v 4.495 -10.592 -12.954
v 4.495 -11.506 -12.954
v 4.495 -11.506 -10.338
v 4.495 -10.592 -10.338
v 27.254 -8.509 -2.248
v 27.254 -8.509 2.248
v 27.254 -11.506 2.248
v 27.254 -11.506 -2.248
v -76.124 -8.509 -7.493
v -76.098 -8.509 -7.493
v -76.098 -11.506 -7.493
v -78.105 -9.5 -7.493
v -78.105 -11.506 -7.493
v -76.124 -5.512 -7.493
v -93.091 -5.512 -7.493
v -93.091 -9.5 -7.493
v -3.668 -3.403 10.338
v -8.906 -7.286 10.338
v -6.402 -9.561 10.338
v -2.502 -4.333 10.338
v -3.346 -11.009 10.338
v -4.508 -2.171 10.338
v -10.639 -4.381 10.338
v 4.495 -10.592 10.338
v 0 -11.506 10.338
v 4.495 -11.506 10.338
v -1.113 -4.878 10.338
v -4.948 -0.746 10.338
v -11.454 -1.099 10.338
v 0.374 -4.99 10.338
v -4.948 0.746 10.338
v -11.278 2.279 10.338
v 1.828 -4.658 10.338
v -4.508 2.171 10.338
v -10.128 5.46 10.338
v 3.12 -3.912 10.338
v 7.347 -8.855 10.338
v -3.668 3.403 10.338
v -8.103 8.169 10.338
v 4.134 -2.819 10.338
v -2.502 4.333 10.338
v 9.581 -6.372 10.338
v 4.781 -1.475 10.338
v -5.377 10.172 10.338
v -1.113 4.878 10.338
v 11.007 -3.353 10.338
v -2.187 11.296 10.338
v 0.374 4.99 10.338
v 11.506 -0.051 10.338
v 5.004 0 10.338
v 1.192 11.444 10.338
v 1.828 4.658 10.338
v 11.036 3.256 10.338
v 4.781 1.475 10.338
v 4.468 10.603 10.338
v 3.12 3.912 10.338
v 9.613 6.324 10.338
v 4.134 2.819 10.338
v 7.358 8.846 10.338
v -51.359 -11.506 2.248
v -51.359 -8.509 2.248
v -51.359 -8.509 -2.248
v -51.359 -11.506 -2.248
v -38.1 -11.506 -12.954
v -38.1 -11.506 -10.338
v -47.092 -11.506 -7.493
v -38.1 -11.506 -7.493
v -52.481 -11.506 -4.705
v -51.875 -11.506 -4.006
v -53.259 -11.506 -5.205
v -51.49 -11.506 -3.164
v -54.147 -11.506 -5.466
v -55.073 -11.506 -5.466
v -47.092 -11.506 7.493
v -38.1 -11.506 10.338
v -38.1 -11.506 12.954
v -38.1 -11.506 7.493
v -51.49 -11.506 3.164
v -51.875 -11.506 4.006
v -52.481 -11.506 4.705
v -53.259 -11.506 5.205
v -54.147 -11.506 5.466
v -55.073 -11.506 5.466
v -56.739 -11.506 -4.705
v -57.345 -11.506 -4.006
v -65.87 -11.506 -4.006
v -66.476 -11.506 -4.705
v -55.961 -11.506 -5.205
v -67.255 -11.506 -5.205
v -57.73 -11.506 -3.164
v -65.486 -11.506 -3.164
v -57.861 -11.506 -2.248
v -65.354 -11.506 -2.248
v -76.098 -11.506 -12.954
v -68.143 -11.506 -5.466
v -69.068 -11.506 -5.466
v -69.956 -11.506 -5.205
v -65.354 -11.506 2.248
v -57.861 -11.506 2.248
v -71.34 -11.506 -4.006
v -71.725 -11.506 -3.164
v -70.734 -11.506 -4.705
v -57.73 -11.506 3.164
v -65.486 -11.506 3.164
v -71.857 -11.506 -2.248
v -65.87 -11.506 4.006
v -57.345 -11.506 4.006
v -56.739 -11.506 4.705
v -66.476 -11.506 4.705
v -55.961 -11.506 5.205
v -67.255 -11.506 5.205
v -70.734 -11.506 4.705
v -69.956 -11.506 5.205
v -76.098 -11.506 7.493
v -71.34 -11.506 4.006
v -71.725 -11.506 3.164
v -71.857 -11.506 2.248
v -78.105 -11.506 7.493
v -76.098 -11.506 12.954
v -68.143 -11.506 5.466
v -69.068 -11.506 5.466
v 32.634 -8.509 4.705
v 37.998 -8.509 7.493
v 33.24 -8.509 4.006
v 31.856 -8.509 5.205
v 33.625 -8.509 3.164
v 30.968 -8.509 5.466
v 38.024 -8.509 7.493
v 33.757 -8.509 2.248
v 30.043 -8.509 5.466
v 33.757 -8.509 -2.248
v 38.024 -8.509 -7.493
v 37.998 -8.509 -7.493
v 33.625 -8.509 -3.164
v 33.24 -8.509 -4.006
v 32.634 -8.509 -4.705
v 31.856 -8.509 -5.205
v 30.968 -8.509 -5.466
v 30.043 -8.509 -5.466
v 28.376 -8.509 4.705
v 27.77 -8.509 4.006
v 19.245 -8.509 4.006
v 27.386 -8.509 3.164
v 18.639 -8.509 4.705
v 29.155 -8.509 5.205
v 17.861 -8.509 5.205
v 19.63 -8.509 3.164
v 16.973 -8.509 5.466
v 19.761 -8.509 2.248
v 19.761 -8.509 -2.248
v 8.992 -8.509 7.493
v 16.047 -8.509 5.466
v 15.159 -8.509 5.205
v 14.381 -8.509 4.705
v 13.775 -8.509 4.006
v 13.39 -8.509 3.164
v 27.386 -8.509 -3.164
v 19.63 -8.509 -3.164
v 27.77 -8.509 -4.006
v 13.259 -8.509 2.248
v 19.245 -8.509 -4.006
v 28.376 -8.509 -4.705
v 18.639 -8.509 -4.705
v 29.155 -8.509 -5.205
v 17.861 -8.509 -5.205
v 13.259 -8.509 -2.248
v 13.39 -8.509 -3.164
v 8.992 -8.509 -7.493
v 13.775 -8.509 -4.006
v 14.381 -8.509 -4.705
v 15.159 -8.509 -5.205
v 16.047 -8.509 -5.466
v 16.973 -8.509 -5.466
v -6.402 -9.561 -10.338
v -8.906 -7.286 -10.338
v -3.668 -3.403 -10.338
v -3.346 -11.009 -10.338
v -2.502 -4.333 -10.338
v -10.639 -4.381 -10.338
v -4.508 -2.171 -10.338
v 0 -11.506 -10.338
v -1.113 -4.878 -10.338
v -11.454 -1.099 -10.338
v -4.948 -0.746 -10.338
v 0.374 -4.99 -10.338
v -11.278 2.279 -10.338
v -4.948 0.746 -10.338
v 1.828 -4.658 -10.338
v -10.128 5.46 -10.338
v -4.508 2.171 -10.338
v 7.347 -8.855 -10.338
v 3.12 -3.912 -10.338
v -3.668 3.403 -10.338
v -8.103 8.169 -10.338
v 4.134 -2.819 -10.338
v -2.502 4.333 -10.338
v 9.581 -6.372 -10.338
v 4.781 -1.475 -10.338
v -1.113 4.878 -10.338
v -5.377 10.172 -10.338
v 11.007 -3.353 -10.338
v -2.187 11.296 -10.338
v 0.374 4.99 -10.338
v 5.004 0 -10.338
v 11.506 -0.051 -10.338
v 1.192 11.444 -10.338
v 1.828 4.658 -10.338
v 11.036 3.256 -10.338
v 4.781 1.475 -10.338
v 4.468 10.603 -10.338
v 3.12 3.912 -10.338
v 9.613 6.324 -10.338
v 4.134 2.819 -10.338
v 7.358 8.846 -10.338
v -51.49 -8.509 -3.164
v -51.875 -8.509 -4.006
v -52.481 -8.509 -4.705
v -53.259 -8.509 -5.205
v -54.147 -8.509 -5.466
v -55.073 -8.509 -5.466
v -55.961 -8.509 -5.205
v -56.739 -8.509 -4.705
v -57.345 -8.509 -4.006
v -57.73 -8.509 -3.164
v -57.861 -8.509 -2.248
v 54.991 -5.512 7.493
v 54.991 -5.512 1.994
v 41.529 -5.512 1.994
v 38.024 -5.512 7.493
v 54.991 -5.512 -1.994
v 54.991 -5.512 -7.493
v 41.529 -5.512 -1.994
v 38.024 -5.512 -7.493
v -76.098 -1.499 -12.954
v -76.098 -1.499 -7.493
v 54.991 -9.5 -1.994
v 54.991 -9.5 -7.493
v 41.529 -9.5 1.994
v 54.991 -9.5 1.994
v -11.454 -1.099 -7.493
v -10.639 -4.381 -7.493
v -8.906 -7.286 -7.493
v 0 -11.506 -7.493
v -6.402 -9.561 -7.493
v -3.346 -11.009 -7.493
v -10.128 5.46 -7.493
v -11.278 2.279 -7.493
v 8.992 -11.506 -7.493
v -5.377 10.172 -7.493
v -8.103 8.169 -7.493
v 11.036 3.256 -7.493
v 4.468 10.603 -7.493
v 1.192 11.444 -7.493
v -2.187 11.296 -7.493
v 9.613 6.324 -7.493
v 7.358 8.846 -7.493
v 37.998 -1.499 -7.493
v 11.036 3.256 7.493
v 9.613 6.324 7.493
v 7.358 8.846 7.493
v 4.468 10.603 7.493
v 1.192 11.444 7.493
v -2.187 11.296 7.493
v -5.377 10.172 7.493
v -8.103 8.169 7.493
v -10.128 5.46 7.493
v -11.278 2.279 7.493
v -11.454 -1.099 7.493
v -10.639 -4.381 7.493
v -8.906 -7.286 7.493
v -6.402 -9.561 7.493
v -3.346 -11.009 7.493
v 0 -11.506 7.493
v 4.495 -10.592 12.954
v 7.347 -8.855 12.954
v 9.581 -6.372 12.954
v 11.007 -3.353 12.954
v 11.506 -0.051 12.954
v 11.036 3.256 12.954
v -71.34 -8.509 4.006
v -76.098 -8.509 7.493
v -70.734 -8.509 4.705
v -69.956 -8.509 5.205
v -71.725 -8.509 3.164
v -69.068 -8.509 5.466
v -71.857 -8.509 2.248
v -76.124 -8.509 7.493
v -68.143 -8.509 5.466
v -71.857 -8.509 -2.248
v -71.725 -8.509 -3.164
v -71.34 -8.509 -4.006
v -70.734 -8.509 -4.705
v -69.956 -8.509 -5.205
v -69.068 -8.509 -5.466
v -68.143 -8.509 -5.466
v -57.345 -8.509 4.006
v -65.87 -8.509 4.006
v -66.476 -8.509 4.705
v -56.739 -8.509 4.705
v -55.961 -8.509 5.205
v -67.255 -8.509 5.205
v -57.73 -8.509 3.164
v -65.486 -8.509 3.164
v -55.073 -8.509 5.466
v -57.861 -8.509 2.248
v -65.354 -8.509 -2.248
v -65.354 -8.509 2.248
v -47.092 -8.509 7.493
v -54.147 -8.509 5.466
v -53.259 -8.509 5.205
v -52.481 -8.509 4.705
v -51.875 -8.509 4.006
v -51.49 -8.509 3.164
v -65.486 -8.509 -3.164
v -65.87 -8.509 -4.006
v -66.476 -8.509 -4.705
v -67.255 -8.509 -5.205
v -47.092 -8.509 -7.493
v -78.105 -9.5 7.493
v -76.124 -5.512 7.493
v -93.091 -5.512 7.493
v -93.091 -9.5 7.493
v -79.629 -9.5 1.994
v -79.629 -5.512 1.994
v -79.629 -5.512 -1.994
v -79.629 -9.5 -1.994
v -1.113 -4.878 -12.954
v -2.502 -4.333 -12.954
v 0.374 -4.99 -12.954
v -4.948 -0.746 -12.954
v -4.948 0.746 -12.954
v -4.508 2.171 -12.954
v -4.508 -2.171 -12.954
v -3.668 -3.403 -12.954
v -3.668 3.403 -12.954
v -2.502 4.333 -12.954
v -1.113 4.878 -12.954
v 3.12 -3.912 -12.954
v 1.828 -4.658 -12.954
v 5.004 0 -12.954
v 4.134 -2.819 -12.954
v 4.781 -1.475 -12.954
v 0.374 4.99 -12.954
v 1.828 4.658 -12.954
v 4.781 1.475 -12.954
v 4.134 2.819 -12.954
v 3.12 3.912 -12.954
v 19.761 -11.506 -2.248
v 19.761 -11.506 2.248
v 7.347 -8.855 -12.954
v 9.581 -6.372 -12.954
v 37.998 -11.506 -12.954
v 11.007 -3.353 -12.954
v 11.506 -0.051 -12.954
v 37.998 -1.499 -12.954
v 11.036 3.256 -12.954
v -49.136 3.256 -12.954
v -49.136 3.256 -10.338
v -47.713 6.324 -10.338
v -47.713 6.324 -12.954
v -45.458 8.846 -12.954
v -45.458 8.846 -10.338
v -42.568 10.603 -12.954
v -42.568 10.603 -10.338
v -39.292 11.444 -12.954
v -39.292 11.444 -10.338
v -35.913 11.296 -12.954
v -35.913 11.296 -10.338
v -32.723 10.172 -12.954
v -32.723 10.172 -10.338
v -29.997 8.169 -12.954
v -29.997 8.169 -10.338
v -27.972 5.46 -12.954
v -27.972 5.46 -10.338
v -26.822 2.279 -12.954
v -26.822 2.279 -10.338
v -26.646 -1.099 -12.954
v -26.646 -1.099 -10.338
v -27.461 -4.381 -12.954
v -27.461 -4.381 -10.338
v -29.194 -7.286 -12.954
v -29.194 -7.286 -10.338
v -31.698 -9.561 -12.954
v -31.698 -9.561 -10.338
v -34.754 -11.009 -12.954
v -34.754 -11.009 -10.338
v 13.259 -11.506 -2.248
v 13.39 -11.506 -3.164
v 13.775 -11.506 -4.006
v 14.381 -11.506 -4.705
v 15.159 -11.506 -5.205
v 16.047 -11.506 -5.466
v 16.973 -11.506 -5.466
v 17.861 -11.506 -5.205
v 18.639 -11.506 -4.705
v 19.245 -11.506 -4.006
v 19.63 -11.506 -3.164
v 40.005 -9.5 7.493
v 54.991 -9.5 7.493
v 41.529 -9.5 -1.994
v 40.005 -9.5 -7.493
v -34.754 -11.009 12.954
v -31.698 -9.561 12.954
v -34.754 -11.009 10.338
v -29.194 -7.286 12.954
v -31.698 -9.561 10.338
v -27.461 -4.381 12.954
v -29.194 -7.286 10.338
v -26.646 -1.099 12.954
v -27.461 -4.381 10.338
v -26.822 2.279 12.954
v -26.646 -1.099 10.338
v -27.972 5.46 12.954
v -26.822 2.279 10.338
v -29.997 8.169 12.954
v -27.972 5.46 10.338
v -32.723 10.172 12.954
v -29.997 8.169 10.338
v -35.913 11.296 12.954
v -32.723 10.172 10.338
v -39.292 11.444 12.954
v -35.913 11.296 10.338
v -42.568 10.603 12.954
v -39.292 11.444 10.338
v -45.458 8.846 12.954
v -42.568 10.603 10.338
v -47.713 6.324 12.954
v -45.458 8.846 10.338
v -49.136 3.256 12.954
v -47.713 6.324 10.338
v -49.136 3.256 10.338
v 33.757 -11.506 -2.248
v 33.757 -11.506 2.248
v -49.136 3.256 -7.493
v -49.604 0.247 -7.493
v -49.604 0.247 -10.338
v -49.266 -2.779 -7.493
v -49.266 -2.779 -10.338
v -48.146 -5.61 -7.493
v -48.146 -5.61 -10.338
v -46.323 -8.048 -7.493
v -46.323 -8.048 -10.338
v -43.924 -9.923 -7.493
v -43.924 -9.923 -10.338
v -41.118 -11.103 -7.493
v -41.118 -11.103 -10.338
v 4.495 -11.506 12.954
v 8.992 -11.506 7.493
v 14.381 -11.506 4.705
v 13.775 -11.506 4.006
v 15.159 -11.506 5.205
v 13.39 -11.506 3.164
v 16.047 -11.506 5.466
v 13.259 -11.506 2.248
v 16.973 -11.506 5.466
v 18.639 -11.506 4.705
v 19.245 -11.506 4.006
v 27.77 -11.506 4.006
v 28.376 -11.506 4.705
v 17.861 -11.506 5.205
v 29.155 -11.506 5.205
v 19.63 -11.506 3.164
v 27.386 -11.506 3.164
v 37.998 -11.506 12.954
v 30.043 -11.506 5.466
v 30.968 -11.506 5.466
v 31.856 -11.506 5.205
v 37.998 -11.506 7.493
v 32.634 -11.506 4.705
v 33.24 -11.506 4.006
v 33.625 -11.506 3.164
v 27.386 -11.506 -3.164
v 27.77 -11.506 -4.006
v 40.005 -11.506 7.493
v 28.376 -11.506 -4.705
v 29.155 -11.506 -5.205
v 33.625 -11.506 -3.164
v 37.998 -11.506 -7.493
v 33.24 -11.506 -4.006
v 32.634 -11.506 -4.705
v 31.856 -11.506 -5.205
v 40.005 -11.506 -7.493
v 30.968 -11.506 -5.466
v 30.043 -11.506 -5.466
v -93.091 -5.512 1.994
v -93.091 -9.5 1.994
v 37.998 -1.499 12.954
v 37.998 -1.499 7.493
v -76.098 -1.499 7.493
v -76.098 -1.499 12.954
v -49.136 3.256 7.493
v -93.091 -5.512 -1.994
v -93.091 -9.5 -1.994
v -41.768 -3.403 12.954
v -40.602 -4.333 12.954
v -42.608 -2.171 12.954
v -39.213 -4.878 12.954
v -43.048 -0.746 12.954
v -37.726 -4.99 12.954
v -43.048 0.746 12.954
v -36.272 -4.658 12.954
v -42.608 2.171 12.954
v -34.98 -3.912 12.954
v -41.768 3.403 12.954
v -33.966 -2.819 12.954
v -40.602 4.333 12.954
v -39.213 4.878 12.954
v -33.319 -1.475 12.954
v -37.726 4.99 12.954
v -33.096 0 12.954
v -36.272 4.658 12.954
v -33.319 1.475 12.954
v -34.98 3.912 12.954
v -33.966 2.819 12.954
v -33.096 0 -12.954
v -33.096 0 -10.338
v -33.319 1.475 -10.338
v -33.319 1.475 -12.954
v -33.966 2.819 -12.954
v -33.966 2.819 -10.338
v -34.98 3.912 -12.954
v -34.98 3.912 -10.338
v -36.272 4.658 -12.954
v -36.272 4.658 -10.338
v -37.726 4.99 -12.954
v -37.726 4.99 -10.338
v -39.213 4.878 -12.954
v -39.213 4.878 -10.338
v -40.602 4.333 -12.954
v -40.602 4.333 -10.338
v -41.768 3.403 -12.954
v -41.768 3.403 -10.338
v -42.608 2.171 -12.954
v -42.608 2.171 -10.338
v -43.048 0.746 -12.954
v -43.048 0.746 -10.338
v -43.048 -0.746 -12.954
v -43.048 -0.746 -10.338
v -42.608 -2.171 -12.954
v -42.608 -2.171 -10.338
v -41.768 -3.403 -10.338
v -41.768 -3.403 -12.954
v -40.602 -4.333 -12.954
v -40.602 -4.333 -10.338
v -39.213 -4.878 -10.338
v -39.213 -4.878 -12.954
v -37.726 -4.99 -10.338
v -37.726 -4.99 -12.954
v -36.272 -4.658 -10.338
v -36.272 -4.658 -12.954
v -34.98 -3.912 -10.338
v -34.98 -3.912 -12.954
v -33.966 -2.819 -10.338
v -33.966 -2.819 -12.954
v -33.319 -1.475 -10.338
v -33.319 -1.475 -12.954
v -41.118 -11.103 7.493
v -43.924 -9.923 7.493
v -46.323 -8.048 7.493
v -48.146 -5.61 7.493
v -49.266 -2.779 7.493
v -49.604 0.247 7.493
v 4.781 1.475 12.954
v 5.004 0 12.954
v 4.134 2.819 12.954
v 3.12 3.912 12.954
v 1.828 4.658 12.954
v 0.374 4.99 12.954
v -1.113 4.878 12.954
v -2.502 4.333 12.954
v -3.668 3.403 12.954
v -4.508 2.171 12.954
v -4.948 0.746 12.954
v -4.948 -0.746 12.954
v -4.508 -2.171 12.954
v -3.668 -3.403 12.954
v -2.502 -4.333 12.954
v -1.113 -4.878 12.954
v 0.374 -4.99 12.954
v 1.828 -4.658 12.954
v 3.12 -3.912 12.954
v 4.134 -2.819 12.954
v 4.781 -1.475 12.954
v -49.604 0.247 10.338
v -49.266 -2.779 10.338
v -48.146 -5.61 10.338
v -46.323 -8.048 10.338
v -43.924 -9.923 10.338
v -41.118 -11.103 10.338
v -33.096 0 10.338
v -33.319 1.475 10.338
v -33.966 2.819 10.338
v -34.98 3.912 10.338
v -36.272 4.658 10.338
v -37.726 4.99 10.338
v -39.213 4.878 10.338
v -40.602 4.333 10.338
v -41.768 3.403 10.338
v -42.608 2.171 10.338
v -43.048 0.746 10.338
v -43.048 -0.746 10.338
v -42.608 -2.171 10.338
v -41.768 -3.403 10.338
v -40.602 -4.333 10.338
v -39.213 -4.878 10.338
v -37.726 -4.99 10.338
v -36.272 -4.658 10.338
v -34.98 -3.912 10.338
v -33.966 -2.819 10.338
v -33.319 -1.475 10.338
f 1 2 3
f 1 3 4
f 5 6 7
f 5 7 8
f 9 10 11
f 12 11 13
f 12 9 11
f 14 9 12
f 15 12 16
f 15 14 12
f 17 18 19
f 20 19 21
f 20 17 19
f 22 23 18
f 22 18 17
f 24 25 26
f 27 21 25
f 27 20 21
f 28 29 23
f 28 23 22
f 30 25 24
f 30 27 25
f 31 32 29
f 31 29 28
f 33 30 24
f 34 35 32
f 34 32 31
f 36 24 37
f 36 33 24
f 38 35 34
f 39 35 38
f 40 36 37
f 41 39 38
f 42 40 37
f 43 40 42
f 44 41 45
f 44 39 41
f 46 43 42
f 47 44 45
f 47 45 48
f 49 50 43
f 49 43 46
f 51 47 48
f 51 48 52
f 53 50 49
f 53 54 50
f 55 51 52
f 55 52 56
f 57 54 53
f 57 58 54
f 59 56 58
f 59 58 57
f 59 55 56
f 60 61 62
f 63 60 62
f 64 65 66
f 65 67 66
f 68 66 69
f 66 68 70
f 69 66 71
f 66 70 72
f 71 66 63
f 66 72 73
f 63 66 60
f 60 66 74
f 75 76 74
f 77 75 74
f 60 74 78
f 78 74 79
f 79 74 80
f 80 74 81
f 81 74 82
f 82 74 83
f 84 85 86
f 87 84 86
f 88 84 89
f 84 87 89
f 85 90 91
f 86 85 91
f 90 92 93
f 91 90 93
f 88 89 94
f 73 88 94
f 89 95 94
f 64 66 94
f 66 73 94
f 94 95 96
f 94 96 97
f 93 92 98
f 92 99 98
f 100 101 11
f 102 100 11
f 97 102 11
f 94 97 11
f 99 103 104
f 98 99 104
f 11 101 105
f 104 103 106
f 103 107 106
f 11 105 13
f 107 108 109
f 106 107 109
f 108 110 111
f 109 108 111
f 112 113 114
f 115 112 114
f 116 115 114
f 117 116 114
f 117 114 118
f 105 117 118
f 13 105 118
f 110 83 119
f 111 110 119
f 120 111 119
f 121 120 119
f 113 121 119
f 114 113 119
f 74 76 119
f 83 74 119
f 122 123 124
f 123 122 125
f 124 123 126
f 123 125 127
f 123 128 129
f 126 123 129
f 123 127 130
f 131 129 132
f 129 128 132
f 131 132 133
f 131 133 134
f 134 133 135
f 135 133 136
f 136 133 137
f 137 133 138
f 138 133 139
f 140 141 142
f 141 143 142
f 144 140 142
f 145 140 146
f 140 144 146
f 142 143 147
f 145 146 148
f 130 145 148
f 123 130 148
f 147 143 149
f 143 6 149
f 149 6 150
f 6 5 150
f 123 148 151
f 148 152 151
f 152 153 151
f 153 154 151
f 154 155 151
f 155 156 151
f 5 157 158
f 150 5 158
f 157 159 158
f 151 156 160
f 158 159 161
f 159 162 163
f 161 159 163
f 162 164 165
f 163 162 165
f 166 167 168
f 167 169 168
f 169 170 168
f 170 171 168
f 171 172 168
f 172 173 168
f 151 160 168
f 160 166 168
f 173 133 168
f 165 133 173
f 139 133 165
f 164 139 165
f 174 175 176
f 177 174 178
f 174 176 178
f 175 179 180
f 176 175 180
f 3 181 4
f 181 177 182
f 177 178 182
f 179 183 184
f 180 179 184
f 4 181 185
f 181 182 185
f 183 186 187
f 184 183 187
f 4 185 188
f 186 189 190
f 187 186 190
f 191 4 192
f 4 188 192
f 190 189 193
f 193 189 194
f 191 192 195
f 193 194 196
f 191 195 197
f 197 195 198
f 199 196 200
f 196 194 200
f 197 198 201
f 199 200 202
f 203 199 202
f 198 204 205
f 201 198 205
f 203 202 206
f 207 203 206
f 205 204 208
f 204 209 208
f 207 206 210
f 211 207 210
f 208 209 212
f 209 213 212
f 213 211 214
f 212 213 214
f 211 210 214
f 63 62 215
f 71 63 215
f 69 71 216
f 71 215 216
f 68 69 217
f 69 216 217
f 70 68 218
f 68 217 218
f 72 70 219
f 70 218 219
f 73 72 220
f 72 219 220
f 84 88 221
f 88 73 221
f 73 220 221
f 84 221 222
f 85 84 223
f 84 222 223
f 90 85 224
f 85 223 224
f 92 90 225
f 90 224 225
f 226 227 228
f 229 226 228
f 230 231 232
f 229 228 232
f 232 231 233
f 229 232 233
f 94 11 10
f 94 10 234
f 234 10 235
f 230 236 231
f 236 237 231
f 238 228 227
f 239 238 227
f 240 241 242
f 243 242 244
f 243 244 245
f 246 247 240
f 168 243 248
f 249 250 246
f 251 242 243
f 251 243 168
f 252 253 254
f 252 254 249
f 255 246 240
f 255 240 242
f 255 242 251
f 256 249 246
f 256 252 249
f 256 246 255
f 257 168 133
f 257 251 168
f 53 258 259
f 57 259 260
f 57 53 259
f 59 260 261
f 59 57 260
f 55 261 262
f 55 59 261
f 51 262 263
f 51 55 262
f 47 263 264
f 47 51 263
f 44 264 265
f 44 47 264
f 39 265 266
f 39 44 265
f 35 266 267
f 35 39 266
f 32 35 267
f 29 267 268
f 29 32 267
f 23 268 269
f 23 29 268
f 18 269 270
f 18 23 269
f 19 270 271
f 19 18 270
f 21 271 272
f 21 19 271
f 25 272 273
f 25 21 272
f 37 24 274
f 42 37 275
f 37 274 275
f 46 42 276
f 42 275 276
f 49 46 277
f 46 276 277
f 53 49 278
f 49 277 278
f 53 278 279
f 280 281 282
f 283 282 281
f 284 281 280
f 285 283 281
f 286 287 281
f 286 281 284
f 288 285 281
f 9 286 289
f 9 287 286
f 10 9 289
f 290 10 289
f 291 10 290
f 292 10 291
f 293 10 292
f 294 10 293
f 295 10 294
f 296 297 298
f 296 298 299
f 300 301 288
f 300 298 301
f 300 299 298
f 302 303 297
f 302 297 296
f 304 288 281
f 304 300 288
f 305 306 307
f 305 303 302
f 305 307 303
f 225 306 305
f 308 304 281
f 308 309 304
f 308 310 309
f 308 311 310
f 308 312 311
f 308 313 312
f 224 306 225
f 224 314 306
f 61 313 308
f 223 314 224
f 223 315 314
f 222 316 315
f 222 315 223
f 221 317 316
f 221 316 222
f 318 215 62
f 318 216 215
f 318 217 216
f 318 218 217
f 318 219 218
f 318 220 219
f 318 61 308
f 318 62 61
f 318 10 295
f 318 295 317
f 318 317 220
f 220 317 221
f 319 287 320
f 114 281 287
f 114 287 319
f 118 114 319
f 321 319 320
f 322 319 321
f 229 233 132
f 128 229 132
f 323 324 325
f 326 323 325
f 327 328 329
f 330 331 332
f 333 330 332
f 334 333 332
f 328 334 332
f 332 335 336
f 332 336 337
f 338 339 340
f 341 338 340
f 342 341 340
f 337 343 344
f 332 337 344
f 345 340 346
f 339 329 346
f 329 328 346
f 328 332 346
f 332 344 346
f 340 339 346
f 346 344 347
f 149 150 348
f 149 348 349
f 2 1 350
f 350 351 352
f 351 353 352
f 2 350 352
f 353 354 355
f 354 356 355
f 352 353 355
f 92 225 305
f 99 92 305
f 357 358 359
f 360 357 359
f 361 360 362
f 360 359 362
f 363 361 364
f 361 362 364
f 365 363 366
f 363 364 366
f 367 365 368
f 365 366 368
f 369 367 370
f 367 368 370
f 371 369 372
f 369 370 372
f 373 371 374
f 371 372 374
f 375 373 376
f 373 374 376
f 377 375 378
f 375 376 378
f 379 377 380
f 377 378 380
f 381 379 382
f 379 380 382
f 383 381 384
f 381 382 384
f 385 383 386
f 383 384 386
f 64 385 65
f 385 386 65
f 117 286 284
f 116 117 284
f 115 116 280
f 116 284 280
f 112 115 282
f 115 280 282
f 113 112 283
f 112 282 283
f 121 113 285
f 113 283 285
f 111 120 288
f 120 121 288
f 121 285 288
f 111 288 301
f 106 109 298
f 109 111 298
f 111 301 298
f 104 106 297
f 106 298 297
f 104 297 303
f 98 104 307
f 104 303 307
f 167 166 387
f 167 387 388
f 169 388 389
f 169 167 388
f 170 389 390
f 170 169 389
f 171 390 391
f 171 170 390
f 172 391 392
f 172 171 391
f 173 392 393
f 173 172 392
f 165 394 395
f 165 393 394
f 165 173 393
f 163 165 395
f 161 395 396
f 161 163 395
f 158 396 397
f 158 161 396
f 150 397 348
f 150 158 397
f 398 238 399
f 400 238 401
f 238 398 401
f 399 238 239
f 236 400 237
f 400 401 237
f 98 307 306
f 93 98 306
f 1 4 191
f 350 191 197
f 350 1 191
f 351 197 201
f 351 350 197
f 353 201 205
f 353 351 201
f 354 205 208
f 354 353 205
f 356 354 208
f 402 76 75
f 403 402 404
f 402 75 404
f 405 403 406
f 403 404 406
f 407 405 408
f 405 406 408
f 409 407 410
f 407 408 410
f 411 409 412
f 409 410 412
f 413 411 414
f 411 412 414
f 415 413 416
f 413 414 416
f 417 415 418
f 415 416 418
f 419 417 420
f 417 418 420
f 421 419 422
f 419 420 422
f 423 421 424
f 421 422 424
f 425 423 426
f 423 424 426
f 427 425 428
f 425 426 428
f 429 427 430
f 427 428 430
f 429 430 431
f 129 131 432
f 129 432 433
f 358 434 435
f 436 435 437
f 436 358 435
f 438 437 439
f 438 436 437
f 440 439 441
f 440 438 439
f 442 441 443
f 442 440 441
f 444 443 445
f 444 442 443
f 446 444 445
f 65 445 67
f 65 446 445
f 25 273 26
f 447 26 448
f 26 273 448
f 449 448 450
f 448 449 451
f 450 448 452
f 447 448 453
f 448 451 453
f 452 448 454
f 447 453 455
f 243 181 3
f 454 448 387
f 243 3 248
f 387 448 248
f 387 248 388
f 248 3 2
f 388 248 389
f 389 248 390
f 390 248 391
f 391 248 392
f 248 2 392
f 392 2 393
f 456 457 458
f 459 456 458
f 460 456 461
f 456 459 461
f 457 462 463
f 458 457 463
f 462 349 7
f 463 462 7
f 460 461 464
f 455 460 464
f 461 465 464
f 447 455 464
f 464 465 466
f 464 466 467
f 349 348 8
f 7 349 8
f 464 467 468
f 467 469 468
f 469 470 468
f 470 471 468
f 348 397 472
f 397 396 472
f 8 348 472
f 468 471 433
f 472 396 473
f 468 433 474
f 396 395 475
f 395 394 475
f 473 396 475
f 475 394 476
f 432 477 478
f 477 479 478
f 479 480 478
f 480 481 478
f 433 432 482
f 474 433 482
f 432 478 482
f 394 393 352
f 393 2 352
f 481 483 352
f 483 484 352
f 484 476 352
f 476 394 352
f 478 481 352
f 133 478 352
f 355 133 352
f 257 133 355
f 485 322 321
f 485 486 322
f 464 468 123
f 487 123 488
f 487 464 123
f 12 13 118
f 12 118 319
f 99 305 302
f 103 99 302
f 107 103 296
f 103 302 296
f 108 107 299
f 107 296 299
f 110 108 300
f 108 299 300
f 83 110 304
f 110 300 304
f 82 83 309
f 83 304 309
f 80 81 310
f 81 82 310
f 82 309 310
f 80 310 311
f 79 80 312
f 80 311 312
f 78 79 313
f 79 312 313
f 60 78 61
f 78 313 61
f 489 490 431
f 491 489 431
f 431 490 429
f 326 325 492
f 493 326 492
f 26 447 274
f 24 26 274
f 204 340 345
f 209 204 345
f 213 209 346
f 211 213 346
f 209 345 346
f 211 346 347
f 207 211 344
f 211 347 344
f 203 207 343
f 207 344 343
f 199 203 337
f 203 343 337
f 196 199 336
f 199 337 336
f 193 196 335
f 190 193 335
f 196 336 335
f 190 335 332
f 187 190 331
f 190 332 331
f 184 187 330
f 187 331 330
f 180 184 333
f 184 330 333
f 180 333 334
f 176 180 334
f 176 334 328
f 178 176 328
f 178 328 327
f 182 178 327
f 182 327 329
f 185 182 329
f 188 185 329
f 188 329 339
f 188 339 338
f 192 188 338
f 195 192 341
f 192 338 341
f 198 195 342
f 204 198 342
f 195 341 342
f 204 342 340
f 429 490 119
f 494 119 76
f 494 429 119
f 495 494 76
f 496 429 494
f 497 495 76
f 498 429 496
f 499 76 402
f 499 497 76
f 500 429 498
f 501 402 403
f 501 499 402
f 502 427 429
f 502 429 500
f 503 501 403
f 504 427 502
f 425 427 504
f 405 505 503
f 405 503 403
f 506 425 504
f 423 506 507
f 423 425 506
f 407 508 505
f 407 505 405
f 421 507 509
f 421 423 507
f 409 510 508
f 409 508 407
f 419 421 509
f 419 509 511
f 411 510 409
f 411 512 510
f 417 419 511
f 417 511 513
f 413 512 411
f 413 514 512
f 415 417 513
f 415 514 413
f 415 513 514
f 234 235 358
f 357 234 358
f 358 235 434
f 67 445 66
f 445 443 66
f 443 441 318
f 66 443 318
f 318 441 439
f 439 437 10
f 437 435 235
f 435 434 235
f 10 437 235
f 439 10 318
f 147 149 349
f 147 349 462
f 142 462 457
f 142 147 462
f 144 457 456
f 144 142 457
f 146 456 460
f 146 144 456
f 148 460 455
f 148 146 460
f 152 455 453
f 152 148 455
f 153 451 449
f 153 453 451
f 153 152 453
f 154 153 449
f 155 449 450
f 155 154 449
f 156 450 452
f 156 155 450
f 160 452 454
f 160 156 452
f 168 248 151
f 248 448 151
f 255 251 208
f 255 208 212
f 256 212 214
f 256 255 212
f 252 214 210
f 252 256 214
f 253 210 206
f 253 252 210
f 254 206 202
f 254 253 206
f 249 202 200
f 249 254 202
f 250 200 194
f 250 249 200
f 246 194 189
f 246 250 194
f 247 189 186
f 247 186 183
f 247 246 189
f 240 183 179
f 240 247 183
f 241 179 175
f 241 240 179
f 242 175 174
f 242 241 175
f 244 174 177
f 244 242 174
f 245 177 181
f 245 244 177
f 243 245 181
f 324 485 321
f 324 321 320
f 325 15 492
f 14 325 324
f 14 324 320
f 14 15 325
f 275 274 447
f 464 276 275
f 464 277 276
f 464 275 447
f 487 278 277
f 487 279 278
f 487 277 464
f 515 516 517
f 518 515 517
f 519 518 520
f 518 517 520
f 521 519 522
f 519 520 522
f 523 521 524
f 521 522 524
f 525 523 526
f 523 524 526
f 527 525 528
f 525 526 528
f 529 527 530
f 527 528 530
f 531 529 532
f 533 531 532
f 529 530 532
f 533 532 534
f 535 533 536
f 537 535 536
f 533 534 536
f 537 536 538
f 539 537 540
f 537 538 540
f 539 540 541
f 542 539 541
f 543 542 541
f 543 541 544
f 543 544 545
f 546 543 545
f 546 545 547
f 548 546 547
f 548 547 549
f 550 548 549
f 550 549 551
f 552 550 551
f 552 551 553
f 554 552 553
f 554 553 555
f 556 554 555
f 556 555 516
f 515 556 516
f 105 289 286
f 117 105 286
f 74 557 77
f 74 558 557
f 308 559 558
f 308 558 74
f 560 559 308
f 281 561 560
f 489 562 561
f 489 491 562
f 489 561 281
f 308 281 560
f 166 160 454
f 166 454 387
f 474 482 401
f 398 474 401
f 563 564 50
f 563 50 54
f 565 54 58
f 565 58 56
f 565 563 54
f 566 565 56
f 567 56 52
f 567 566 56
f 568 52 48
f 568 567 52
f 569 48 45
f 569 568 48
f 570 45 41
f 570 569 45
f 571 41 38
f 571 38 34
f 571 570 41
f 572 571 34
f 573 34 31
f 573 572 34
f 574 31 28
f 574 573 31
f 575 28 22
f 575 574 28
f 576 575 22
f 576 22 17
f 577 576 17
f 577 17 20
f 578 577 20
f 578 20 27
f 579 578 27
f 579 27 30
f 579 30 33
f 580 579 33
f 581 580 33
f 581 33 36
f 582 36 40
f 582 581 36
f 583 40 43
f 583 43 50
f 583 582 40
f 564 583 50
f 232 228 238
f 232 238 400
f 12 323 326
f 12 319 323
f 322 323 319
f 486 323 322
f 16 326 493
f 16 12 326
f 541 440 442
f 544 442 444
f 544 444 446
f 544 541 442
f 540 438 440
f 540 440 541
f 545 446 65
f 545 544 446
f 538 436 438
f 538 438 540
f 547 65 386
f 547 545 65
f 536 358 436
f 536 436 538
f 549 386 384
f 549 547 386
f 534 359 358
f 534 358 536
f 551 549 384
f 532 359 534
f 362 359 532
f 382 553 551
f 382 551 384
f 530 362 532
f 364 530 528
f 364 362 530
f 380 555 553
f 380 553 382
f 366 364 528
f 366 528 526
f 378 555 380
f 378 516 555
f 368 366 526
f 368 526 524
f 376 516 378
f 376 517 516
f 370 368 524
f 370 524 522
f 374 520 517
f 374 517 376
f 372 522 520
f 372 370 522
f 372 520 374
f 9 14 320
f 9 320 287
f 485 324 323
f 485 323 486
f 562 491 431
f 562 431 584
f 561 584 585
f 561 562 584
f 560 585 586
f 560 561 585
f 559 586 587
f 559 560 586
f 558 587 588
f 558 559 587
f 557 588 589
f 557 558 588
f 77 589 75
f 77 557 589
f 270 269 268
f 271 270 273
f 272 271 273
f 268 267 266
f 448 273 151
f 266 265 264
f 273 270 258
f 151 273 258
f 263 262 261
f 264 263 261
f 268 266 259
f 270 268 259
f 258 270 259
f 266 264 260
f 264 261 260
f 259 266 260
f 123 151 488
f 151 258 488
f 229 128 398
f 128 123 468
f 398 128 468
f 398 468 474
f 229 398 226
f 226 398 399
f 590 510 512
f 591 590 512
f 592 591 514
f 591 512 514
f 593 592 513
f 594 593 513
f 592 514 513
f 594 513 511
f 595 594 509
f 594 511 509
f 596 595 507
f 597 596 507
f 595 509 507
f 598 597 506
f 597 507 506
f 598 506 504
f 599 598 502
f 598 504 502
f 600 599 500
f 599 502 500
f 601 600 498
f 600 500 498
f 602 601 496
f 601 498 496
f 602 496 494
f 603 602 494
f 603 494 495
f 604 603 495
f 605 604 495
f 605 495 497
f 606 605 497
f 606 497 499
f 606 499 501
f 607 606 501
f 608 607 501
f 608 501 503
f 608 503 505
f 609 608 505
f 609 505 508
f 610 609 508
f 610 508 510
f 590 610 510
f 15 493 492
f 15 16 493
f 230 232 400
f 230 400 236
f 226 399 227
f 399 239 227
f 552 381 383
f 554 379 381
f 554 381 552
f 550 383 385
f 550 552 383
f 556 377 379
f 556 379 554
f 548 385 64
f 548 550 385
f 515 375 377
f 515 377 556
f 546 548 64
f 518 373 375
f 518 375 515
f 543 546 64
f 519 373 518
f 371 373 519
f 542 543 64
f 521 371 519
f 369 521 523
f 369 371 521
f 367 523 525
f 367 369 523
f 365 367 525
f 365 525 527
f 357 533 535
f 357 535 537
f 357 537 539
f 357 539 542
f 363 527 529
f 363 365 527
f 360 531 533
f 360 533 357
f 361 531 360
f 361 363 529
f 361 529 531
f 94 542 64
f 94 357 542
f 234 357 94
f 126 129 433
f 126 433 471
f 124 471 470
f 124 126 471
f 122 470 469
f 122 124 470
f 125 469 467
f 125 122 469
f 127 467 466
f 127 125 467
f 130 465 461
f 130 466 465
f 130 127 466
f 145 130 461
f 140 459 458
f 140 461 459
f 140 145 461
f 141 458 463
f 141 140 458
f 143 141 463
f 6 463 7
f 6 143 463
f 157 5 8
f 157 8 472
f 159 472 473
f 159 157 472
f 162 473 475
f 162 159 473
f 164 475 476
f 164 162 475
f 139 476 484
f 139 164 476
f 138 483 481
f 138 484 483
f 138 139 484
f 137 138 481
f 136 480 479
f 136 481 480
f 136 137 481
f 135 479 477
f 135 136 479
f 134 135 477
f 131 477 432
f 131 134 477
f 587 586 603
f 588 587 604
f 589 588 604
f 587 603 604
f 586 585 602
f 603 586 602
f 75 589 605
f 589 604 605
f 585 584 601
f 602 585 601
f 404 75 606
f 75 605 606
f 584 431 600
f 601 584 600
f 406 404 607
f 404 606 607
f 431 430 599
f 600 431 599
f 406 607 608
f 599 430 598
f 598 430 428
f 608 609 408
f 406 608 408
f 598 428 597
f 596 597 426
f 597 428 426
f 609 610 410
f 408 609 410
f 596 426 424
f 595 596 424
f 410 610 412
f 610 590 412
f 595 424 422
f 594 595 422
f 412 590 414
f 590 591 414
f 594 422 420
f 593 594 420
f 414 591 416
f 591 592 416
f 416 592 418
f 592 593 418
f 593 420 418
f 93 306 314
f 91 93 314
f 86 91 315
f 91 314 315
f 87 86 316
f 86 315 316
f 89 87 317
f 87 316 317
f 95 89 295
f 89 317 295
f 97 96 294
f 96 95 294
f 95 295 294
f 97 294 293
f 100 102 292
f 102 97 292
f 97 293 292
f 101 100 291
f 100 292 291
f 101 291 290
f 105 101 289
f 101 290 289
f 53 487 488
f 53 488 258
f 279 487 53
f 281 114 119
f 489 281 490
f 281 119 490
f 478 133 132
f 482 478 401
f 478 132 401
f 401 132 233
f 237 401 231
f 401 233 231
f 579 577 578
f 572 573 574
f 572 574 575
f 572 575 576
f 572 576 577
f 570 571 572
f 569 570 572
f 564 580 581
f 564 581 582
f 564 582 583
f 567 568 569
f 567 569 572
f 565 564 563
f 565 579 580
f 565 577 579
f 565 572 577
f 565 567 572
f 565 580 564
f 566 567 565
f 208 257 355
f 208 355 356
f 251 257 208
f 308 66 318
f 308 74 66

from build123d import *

# Parameters (mm, degrees)
EXTRUDE1_DEPTH             = 12.954
SKETCH3_R                  = 5.0038
CUT_EXTRUDE1_DEPTH         = 2.6162
CUT_EXTRUDE2_DEPTH         = 7.493
EXTRUDE2_REACH             = 43.762
EXTRUDE2_DIRECTION_2_REACH = 43.762
SKETCH7_W                  = 13.462
SKETCH7_H                  = 3.9878
CUT_EXTRUDE3_DEPTH         = 60.003631422
CUT_EXTRUDE4_DEPTH         = 60.936836987
EXTRUDE3_OUTLINE_R         = 5.0038
EXTRUDE3_DEPTH             = 2.6162
EXTRUDE4_DEPTH             = 2.6162
SKETCH9_R                  = 5.0038
CUT_EXTRUDE5_DEPTH         = 98.311619982
CUT_EXTRUDE6_START         = -10.3378
SKETCH12_R                 = 11.5062
CUT_EXTRUDE6_DEPTH         = 20.6756


# Read off the part's stored shape, not the designer's step: Extrude3
with BuildPart() as part:
    # Sketch2 → Extrude1 (new, symmetric)
    with BuildSketch(Plane.XY):
        with BuildLine():
            Line((37.9984, -11.5062), (37.9984, -1.4986))
            Line((37.9984, -1.4986), (11.036020087, 3.255595043))
            ThreePointArc((11.036020087, 3.255595043), (-9.215534877, 6.889597621), (0, -11.5062))
            Line((0, -11.5062), (37.9984, -11.5062))
        make_face()
    extrude(amount=EXTRUDE1_DEPTH, both=True)

    # Sketch3 → Cut-Extrude1 (cut)
    with BuildSketch(Plane.XY.offset(12.954)):
        with BuildLine():
            Line((0, -11.5062), (4.495154191, -11.5062))
            Line((4.495154191, -11.5062), (4.495154191, -10.5918))
            ThreePointArc((4.495154191, -10.5918), (-2.293607342, 11.27528287), (0, -11.5062))
        make_face()
        Circle(SKETCH3_R, mode=Mode.SUBTRACT)
    cut_extrude1 = extrude(amount=-CUT_EXTRUDE1_DEPTH, mode=Mode.SUBTRACT)

    # Mirror1: Cut-Extrude1 across plane
    add(cut_extrude1.mirror(Plane.XY), mode=Mode.SUBTRACT)

    # Sketch4 → Cut-Extrude2 (cut, symmetric)
    with BuildSketch(Plane.XY):
        with BuildLine():
            Line((8.9916, -8.509), (37.9984, -8.509))
            Line((37.9984, -8.509), (37.9984, -1.4986))
            Line((37.9984, -1.4986), (11.036020087, 3.255595043))
            ThreePointArc((11.036020087, 3.255595043), (-9.215534877, 6.889597621), (0, -11.5062))
            Line((0, -11.5062), (8.9916, -11.5062))
            Line((8.9916, -11.5062), (8.9916, -8.509))
        make_face()
    extrude(amount=CUT_EXTRUDE2_DEPTH, both=True, mode=Mode.SUBTRACT)

    # Extrude2: up to this face of the body (flat: up to its plane)
    extrude2_end = Plane(part.part.faces().sort_by_distance((8.815484891, -1.610467544, -7.493))[0])
    # Sketch5 → Extrude2 (add, up to the picked face)
    with BuildSketch(Plane.XY, mode=Mode.PRIVATE) as extrude2_sk1:
        Polygon((54.991, -5.5118), (38.0238, -5.5118), (38.0238, -8.509), (37.9984, -8.509), (37.9984, -11.5062), (40.005, -11.5062), (40.005, -9.4996), (54.991, -9.4996), align=None)
    extrude2_tool1 = split(extrude(extrude2_sk1.sketch, amount=-EXTRUDE2_REACH, mode=Mode.PRIVATE), bisect_by=extrude2_end, keep=Keep.BOTH, mode=Mode.PRIVATE)
    add(extrude2_tool1.solids().sort_by(Axis((46.083002, -7.674508, 0), (0, 0, -1)))[0])

    # Extrude2 direction 2: up to this face of the body (flat: up to its plane)
    extrude2_direction_2_end = Plane(part.part.faces().sort_by_distance((8.815484891, -1.610467544, 7.493))[0])
    # Sketch5 → Extrude2 direction 2 (add, up to the picked face)
    with BuildSketch(Plane.XY, mode=Mode.PRIVATE) as extrude2_direction_2_sk1:
        Polygon((54.991, -5.5118), (38.0238, -5.5118), (38.0238, -8.509), (37.9984, -8.509), (37.9984, -11.5062), (40.005, -11.5062), (40.005, -9.4996), (54.991, -9.4996), align=None)
    extrude2_direction_2_tool1 = split(extrude(extrude2_direction_2_sk1.sketch, amount=EXTRUDE2_DIRECTION_2_REACH, mode=Mode.PRIVATE), bisect_by=extrude2_direction_2_end, keep=Keep.BOTH, mode=Mode.PRIVATE)
    add(extrude2_direction_2_tool1.solids().sort_by(Axis((46.083002, -7.674508, 0), (0, 0, 1)))[0])

    # Sketch7 → Cut-Extrude3 (cut, through all)
    with BuildSketch(Plane(origin=(0, -5.5118, 0), x_dir=(1, 0, 0), z_dir=(0, 1, 0))):
        with Locations((48.26, 0)):
            Rectangle(SKETCH7_W, SKETCH7_H)
    extrude(amount=-CUT_EXTRUDE3_DEPTH, mode=Mode.SUBTRACT)

    # Sketch8 → Cut-Extrude4 (cut, through all)
    with BuildSketch(Plane(origin=(0, -8.509, 0), x_dir=(1, 0, 0), z_dir=(0, 1, 0))):
        with BuildLine():
            Line((19.7612, 2.2479), (19.7612, -2.2479))
            ThreePointArc((19.7612, -2.2479), (16.51, -5.4991), (13.2588, -2.2479))
            Line((13.2588, -2.2479), (13.2588, 2.2479))
            ThreePointArc((13.2588, 2.2479), (16.51, 5.4991), (19.7612, 2.2479))
        make_face()
        with BuildLine():
            Line((33.7566, 2.2479), (33.7566, -2.2479))
            ThreePointArc((33.7566, -2.2479), (30.5054, -5.4991), (27.2542, -2.2479))
            Line((27.2542, -2.2479), (27.2542, 2.2479))
            ThreePointArc((27.2542, 2.2479), (30.5054, 5.4991), (33.7566, 2.2479))
        make_face()
    extrude(amount=-CUT_EXTRUDE4_DEPTH, mode=Mode.SUBTRACT)


with BuildPart() as body_2:
    # Mirror3: mirrored copy
    add(part.part.mirror(Plane(origin=(-19.05, 0, 0), x_dir=(0, 0, 1), z_dir=(1, 0, 0))))

    # Extrude3 outline → Extrude3 (add)
    with BuildSketch(Plane.XY.offset(10.3378)):
        with BuildLine():
            ThreePointArc((-38.1, -11.5062), (-28.884465123, 6.889597621), (-49.136020087, 3.255595043))
            ThreePointArc((-49.136020087, 3.255595043), (-48.503938244, -4.91433693), (-42.595154191, -10.5918))
            Line((-42.595154191, -10.5918), (-42.595154191, -11.5062))
            Line((-42.595154191, -11.5062), (-38.1, -11.5062))
        make_face()
        with Locations((-38.1, 0)):
            Circle(EXTRUDE3_OUTLINE_R, mode=Mode.SUBTRACT)
    extrude(amount=EXTRUDE3_DEPTH)

    # Sketch11 → Extrude4 (add)
    with BuildSketch(Plane(origin=(0, 0, -10.3378), x_dir=(-1, 0, 0), z_dir=(0, 0, -1))):
        with BuildLine():
            Line((38.1, -11.5062), (42.595154191, -11.5062))
            Line((42.595154191, -11.5062), (42.595154191, -10.5918))
            ThreePointArc((42.595154191, -10.5918), (48.503938244, -4.91433693), (49.136020087, 3.255595043))
            ThreePointArc((49.136020087, 3.255595043), (28.884465123, 6.889597621), (38.1, -11.5062))
        make_face()
    extrude(amount=EXTRUDE4_DEPTH)

    # Sketch9 → Cut-Extrude5 (cut, through all)
    with BuildSketch(Plane.XY.offset(12.954)):
        with Locations((-38.1, 0)):
            Circle(SKETCH9_R)
    extrude(amount=-CUT_EXTRUDE5_DEPTH, mode=Mode.SUBTRACT)

    # Sketch12 → Cut-Extrude6 (cut)
    with BuildSketch(Plane.XY.offset(CUT_EXTRUDE6_START)):
        with Locations((-38.1, 0)):
            Circle(SKETCH12_R)
    extrude(amount=CUT_EXTRUDE6_DEPTH, mode=Mode.SUBTRACT)


solid = Compound([part.part, body_2.part])
